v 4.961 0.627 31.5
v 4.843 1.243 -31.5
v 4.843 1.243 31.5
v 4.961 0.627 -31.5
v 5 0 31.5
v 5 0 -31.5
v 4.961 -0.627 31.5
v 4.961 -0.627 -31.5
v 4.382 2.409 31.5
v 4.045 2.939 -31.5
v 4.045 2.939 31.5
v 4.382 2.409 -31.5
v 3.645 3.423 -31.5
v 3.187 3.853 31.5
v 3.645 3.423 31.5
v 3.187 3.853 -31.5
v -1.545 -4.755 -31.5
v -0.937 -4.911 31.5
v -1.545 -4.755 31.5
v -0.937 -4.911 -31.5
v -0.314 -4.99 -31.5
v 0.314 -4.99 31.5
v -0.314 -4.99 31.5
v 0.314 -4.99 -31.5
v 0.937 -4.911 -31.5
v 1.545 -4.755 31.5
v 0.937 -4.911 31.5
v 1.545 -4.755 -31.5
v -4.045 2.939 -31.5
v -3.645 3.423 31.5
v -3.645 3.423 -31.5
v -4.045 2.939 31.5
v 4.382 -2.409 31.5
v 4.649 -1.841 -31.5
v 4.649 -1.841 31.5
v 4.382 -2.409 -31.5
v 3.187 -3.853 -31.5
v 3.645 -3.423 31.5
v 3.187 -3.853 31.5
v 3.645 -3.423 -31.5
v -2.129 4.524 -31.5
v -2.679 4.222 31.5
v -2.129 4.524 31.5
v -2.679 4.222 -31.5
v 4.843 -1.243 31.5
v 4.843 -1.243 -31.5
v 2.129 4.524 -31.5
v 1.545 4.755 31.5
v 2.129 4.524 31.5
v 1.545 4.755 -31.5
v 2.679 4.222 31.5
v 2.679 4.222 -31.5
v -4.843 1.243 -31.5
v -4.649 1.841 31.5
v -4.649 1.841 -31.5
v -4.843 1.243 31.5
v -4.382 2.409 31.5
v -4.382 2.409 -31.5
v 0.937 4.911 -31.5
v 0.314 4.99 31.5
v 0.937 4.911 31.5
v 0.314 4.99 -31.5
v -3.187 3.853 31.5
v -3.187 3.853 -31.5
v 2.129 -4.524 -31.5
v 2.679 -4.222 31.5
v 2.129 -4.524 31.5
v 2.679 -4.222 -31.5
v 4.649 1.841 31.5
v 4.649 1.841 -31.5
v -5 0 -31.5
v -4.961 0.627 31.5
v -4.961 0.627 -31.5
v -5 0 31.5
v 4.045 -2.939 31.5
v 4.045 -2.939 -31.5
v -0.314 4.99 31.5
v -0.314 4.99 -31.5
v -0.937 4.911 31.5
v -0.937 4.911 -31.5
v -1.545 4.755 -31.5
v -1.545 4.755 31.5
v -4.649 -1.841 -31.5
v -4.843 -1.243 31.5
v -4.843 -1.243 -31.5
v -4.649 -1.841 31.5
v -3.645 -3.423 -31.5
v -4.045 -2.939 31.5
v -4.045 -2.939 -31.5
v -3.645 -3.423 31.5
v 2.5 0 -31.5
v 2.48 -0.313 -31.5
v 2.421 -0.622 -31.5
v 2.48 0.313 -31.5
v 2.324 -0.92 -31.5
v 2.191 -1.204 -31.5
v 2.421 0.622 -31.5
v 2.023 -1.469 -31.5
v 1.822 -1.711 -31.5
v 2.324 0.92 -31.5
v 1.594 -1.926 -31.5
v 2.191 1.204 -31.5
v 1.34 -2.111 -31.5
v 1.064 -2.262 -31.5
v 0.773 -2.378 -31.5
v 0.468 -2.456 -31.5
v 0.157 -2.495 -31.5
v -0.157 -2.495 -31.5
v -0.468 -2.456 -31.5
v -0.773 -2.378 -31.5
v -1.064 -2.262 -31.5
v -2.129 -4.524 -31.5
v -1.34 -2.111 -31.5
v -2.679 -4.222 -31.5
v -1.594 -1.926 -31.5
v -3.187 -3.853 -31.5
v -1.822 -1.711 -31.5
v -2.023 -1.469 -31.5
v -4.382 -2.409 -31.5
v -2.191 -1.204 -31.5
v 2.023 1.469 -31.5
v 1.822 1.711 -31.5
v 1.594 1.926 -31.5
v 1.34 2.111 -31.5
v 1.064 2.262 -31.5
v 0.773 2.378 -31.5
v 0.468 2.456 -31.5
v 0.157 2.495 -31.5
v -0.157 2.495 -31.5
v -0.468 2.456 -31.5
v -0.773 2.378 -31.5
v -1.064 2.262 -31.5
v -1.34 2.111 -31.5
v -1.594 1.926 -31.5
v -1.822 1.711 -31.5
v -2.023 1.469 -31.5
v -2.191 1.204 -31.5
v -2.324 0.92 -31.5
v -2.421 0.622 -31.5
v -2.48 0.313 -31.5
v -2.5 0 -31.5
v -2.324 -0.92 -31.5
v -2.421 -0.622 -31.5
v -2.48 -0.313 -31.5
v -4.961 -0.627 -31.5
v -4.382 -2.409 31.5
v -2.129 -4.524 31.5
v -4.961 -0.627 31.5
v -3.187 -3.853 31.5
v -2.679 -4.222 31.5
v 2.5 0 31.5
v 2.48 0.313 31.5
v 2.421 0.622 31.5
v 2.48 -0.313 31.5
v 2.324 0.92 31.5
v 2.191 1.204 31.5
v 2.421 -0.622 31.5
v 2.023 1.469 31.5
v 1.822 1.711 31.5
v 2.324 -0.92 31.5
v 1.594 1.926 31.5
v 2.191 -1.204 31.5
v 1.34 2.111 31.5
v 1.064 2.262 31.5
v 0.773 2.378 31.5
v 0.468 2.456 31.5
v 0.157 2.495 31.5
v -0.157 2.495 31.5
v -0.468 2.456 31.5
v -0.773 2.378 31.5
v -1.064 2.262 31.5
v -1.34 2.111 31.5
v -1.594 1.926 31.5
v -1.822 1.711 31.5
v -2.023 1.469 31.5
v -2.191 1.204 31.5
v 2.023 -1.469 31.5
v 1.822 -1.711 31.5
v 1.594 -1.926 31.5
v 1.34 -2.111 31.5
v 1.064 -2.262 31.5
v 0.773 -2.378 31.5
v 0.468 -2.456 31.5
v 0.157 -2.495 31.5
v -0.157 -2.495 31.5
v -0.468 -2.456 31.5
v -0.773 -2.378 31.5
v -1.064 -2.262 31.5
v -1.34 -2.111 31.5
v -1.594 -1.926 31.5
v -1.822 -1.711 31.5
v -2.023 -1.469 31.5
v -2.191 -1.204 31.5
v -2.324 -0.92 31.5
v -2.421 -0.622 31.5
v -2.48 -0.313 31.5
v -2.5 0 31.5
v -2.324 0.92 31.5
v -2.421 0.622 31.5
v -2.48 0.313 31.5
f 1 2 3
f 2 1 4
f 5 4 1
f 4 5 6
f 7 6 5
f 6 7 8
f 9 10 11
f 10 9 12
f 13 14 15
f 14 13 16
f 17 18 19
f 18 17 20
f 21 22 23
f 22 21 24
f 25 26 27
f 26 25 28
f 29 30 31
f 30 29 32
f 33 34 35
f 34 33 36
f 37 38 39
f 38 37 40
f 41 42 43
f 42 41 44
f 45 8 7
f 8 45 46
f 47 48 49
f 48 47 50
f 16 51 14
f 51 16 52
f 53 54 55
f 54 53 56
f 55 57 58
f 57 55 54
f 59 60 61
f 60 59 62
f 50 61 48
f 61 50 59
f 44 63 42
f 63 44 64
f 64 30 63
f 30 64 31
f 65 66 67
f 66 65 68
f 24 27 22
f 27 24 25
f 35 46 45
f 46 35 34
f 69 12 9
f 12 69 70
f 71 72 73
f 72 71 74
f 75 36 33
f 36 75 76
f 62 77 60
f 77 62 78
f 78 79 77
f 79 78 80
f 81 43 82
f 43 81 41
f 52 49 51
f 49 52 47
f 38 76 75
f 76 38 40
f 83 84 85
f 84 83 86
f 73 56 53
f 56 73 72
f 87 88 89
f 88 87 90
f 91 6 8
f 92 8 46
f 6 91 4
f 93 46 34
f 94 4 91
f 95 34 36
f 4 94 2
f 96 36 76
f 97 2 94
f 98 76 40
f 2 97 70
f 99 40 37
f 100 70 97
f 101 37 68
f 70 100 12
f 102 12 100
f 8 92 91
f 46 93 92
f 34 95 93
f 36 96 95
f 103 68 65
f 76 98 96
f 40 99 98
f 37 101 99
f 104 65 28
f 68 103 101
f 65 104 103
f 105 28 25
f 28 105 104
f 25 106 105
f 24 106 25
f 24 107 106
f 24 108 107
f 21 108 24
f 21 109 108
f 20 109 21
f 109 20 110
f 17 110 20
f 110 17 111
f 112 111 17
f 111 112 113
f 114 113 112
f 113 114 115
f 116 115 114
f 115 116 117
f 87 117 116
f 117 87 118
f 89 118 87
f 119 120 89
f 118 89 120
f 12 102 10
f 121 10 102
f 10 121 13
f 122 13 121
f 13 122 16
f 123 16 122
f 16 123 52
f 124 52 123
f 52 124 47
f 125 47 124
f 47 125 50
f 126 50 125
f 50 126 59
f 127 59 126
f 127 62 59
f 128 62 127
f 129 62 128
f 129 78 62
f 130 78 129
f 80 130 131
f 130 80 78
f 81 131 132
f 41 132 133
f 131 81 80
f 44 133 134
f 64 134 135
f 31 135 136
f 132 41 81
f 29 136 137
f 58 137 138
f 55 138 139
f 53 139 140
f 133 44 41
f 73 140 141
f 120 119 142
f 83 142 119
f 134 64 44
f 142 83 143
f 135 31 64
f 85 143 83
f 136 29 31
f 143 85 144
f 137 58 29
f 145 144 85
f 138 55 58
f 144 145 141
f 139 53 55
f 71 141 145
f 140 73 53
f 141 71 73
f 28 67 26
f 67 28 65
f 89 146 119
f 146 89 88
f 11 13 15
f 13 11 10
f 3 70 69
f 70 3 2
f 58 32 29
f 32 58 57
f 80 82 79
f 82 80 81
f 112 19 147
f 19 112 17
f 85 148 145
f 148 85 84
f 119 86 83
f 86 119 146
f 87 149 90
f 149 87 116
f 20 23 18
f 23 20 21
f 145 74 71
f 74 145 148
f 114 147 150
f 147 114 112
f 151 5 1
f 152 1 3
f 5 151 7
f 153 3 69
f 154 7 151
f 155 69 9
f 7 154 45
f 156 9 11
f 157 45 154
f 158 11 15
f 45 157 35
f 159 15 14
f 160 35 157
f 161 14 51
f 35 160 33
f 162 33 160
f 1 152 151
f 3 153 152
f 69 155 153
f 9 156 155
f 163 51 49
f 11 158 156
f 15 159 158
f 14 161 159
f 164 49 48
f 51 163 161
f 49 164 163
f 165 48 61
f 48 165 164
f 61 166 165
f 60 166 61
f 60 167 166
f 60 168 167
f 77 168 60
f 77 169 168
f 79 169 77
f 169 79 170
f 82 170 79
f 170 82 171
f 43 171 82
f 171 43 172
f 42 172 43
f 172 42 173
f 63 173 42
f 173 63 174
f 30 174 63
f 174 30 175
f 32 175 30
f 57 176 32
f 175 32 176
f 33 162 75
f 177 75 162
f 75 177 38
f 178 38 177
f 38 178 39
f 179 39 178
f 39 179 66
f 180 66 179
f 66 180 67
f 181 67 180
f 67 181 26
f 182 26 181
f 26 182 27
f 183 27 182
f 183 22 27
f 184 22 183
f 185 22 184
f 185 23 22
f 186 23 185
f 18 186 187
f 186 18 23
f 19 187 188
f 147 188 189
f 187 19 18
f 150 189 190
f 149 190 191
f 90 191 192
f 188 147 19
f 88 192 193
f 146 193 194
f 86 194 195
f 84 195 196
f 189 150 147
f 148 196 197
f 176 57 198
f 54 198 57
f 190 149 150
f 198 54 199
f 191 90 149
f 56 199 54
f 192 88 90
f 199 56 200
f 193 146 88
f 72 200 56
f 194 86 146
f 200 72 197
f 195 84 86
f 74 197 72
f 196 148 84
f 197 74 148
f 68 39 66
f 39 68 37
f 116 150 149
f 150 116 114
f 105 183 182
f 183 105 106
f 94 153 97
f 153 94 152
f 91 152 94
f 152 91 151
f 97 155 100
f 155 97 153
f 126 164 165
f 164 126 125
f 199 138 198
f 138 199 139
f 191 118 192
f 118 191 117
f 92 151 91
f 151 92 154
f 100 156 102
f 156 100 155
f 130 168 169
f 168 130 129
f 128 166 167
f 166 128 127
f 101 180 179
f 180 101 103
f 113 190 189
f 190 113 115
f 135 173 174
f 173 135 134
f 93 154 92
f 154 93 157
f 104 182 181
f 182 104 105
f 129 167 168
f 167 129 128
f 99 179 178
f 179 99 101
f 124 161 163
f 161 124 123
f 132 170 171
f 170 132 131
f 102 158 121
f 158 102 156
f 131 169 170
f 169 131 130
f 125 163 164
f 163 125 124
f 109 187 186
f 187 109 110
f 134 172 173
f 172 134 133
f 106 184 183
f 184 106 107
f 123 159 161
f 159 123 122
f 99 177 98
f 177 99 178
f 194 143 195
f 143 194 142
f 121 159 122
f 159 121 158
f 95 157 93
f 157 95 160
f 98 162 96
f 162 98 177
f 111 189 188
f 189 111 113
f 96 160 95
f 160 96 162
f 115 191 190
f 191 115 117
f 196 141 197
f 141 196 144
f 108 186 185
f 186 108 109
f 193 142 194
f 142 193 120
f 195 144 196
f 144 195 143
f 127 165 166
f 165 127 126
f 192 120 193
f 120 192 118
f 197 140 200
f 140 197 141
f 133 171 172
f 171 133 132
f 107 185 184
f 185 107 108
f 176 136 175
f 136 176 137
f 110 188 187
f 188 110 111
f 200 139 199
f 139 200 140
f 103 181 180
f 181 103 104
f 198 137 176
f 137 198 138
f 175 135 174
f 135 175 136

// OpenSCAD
$fn = 50;


difference() {
	union() {
		translate(v = [0, 0, -31.5000000000]) {
			cylinder(h = 63, r = 5.0000000000);
		}
	}
	union() {
		translate(v = [0, 0, -100.0000000000]) {
			cylinder(h = 200, r = 2.5000000000);
		}
	}
}
